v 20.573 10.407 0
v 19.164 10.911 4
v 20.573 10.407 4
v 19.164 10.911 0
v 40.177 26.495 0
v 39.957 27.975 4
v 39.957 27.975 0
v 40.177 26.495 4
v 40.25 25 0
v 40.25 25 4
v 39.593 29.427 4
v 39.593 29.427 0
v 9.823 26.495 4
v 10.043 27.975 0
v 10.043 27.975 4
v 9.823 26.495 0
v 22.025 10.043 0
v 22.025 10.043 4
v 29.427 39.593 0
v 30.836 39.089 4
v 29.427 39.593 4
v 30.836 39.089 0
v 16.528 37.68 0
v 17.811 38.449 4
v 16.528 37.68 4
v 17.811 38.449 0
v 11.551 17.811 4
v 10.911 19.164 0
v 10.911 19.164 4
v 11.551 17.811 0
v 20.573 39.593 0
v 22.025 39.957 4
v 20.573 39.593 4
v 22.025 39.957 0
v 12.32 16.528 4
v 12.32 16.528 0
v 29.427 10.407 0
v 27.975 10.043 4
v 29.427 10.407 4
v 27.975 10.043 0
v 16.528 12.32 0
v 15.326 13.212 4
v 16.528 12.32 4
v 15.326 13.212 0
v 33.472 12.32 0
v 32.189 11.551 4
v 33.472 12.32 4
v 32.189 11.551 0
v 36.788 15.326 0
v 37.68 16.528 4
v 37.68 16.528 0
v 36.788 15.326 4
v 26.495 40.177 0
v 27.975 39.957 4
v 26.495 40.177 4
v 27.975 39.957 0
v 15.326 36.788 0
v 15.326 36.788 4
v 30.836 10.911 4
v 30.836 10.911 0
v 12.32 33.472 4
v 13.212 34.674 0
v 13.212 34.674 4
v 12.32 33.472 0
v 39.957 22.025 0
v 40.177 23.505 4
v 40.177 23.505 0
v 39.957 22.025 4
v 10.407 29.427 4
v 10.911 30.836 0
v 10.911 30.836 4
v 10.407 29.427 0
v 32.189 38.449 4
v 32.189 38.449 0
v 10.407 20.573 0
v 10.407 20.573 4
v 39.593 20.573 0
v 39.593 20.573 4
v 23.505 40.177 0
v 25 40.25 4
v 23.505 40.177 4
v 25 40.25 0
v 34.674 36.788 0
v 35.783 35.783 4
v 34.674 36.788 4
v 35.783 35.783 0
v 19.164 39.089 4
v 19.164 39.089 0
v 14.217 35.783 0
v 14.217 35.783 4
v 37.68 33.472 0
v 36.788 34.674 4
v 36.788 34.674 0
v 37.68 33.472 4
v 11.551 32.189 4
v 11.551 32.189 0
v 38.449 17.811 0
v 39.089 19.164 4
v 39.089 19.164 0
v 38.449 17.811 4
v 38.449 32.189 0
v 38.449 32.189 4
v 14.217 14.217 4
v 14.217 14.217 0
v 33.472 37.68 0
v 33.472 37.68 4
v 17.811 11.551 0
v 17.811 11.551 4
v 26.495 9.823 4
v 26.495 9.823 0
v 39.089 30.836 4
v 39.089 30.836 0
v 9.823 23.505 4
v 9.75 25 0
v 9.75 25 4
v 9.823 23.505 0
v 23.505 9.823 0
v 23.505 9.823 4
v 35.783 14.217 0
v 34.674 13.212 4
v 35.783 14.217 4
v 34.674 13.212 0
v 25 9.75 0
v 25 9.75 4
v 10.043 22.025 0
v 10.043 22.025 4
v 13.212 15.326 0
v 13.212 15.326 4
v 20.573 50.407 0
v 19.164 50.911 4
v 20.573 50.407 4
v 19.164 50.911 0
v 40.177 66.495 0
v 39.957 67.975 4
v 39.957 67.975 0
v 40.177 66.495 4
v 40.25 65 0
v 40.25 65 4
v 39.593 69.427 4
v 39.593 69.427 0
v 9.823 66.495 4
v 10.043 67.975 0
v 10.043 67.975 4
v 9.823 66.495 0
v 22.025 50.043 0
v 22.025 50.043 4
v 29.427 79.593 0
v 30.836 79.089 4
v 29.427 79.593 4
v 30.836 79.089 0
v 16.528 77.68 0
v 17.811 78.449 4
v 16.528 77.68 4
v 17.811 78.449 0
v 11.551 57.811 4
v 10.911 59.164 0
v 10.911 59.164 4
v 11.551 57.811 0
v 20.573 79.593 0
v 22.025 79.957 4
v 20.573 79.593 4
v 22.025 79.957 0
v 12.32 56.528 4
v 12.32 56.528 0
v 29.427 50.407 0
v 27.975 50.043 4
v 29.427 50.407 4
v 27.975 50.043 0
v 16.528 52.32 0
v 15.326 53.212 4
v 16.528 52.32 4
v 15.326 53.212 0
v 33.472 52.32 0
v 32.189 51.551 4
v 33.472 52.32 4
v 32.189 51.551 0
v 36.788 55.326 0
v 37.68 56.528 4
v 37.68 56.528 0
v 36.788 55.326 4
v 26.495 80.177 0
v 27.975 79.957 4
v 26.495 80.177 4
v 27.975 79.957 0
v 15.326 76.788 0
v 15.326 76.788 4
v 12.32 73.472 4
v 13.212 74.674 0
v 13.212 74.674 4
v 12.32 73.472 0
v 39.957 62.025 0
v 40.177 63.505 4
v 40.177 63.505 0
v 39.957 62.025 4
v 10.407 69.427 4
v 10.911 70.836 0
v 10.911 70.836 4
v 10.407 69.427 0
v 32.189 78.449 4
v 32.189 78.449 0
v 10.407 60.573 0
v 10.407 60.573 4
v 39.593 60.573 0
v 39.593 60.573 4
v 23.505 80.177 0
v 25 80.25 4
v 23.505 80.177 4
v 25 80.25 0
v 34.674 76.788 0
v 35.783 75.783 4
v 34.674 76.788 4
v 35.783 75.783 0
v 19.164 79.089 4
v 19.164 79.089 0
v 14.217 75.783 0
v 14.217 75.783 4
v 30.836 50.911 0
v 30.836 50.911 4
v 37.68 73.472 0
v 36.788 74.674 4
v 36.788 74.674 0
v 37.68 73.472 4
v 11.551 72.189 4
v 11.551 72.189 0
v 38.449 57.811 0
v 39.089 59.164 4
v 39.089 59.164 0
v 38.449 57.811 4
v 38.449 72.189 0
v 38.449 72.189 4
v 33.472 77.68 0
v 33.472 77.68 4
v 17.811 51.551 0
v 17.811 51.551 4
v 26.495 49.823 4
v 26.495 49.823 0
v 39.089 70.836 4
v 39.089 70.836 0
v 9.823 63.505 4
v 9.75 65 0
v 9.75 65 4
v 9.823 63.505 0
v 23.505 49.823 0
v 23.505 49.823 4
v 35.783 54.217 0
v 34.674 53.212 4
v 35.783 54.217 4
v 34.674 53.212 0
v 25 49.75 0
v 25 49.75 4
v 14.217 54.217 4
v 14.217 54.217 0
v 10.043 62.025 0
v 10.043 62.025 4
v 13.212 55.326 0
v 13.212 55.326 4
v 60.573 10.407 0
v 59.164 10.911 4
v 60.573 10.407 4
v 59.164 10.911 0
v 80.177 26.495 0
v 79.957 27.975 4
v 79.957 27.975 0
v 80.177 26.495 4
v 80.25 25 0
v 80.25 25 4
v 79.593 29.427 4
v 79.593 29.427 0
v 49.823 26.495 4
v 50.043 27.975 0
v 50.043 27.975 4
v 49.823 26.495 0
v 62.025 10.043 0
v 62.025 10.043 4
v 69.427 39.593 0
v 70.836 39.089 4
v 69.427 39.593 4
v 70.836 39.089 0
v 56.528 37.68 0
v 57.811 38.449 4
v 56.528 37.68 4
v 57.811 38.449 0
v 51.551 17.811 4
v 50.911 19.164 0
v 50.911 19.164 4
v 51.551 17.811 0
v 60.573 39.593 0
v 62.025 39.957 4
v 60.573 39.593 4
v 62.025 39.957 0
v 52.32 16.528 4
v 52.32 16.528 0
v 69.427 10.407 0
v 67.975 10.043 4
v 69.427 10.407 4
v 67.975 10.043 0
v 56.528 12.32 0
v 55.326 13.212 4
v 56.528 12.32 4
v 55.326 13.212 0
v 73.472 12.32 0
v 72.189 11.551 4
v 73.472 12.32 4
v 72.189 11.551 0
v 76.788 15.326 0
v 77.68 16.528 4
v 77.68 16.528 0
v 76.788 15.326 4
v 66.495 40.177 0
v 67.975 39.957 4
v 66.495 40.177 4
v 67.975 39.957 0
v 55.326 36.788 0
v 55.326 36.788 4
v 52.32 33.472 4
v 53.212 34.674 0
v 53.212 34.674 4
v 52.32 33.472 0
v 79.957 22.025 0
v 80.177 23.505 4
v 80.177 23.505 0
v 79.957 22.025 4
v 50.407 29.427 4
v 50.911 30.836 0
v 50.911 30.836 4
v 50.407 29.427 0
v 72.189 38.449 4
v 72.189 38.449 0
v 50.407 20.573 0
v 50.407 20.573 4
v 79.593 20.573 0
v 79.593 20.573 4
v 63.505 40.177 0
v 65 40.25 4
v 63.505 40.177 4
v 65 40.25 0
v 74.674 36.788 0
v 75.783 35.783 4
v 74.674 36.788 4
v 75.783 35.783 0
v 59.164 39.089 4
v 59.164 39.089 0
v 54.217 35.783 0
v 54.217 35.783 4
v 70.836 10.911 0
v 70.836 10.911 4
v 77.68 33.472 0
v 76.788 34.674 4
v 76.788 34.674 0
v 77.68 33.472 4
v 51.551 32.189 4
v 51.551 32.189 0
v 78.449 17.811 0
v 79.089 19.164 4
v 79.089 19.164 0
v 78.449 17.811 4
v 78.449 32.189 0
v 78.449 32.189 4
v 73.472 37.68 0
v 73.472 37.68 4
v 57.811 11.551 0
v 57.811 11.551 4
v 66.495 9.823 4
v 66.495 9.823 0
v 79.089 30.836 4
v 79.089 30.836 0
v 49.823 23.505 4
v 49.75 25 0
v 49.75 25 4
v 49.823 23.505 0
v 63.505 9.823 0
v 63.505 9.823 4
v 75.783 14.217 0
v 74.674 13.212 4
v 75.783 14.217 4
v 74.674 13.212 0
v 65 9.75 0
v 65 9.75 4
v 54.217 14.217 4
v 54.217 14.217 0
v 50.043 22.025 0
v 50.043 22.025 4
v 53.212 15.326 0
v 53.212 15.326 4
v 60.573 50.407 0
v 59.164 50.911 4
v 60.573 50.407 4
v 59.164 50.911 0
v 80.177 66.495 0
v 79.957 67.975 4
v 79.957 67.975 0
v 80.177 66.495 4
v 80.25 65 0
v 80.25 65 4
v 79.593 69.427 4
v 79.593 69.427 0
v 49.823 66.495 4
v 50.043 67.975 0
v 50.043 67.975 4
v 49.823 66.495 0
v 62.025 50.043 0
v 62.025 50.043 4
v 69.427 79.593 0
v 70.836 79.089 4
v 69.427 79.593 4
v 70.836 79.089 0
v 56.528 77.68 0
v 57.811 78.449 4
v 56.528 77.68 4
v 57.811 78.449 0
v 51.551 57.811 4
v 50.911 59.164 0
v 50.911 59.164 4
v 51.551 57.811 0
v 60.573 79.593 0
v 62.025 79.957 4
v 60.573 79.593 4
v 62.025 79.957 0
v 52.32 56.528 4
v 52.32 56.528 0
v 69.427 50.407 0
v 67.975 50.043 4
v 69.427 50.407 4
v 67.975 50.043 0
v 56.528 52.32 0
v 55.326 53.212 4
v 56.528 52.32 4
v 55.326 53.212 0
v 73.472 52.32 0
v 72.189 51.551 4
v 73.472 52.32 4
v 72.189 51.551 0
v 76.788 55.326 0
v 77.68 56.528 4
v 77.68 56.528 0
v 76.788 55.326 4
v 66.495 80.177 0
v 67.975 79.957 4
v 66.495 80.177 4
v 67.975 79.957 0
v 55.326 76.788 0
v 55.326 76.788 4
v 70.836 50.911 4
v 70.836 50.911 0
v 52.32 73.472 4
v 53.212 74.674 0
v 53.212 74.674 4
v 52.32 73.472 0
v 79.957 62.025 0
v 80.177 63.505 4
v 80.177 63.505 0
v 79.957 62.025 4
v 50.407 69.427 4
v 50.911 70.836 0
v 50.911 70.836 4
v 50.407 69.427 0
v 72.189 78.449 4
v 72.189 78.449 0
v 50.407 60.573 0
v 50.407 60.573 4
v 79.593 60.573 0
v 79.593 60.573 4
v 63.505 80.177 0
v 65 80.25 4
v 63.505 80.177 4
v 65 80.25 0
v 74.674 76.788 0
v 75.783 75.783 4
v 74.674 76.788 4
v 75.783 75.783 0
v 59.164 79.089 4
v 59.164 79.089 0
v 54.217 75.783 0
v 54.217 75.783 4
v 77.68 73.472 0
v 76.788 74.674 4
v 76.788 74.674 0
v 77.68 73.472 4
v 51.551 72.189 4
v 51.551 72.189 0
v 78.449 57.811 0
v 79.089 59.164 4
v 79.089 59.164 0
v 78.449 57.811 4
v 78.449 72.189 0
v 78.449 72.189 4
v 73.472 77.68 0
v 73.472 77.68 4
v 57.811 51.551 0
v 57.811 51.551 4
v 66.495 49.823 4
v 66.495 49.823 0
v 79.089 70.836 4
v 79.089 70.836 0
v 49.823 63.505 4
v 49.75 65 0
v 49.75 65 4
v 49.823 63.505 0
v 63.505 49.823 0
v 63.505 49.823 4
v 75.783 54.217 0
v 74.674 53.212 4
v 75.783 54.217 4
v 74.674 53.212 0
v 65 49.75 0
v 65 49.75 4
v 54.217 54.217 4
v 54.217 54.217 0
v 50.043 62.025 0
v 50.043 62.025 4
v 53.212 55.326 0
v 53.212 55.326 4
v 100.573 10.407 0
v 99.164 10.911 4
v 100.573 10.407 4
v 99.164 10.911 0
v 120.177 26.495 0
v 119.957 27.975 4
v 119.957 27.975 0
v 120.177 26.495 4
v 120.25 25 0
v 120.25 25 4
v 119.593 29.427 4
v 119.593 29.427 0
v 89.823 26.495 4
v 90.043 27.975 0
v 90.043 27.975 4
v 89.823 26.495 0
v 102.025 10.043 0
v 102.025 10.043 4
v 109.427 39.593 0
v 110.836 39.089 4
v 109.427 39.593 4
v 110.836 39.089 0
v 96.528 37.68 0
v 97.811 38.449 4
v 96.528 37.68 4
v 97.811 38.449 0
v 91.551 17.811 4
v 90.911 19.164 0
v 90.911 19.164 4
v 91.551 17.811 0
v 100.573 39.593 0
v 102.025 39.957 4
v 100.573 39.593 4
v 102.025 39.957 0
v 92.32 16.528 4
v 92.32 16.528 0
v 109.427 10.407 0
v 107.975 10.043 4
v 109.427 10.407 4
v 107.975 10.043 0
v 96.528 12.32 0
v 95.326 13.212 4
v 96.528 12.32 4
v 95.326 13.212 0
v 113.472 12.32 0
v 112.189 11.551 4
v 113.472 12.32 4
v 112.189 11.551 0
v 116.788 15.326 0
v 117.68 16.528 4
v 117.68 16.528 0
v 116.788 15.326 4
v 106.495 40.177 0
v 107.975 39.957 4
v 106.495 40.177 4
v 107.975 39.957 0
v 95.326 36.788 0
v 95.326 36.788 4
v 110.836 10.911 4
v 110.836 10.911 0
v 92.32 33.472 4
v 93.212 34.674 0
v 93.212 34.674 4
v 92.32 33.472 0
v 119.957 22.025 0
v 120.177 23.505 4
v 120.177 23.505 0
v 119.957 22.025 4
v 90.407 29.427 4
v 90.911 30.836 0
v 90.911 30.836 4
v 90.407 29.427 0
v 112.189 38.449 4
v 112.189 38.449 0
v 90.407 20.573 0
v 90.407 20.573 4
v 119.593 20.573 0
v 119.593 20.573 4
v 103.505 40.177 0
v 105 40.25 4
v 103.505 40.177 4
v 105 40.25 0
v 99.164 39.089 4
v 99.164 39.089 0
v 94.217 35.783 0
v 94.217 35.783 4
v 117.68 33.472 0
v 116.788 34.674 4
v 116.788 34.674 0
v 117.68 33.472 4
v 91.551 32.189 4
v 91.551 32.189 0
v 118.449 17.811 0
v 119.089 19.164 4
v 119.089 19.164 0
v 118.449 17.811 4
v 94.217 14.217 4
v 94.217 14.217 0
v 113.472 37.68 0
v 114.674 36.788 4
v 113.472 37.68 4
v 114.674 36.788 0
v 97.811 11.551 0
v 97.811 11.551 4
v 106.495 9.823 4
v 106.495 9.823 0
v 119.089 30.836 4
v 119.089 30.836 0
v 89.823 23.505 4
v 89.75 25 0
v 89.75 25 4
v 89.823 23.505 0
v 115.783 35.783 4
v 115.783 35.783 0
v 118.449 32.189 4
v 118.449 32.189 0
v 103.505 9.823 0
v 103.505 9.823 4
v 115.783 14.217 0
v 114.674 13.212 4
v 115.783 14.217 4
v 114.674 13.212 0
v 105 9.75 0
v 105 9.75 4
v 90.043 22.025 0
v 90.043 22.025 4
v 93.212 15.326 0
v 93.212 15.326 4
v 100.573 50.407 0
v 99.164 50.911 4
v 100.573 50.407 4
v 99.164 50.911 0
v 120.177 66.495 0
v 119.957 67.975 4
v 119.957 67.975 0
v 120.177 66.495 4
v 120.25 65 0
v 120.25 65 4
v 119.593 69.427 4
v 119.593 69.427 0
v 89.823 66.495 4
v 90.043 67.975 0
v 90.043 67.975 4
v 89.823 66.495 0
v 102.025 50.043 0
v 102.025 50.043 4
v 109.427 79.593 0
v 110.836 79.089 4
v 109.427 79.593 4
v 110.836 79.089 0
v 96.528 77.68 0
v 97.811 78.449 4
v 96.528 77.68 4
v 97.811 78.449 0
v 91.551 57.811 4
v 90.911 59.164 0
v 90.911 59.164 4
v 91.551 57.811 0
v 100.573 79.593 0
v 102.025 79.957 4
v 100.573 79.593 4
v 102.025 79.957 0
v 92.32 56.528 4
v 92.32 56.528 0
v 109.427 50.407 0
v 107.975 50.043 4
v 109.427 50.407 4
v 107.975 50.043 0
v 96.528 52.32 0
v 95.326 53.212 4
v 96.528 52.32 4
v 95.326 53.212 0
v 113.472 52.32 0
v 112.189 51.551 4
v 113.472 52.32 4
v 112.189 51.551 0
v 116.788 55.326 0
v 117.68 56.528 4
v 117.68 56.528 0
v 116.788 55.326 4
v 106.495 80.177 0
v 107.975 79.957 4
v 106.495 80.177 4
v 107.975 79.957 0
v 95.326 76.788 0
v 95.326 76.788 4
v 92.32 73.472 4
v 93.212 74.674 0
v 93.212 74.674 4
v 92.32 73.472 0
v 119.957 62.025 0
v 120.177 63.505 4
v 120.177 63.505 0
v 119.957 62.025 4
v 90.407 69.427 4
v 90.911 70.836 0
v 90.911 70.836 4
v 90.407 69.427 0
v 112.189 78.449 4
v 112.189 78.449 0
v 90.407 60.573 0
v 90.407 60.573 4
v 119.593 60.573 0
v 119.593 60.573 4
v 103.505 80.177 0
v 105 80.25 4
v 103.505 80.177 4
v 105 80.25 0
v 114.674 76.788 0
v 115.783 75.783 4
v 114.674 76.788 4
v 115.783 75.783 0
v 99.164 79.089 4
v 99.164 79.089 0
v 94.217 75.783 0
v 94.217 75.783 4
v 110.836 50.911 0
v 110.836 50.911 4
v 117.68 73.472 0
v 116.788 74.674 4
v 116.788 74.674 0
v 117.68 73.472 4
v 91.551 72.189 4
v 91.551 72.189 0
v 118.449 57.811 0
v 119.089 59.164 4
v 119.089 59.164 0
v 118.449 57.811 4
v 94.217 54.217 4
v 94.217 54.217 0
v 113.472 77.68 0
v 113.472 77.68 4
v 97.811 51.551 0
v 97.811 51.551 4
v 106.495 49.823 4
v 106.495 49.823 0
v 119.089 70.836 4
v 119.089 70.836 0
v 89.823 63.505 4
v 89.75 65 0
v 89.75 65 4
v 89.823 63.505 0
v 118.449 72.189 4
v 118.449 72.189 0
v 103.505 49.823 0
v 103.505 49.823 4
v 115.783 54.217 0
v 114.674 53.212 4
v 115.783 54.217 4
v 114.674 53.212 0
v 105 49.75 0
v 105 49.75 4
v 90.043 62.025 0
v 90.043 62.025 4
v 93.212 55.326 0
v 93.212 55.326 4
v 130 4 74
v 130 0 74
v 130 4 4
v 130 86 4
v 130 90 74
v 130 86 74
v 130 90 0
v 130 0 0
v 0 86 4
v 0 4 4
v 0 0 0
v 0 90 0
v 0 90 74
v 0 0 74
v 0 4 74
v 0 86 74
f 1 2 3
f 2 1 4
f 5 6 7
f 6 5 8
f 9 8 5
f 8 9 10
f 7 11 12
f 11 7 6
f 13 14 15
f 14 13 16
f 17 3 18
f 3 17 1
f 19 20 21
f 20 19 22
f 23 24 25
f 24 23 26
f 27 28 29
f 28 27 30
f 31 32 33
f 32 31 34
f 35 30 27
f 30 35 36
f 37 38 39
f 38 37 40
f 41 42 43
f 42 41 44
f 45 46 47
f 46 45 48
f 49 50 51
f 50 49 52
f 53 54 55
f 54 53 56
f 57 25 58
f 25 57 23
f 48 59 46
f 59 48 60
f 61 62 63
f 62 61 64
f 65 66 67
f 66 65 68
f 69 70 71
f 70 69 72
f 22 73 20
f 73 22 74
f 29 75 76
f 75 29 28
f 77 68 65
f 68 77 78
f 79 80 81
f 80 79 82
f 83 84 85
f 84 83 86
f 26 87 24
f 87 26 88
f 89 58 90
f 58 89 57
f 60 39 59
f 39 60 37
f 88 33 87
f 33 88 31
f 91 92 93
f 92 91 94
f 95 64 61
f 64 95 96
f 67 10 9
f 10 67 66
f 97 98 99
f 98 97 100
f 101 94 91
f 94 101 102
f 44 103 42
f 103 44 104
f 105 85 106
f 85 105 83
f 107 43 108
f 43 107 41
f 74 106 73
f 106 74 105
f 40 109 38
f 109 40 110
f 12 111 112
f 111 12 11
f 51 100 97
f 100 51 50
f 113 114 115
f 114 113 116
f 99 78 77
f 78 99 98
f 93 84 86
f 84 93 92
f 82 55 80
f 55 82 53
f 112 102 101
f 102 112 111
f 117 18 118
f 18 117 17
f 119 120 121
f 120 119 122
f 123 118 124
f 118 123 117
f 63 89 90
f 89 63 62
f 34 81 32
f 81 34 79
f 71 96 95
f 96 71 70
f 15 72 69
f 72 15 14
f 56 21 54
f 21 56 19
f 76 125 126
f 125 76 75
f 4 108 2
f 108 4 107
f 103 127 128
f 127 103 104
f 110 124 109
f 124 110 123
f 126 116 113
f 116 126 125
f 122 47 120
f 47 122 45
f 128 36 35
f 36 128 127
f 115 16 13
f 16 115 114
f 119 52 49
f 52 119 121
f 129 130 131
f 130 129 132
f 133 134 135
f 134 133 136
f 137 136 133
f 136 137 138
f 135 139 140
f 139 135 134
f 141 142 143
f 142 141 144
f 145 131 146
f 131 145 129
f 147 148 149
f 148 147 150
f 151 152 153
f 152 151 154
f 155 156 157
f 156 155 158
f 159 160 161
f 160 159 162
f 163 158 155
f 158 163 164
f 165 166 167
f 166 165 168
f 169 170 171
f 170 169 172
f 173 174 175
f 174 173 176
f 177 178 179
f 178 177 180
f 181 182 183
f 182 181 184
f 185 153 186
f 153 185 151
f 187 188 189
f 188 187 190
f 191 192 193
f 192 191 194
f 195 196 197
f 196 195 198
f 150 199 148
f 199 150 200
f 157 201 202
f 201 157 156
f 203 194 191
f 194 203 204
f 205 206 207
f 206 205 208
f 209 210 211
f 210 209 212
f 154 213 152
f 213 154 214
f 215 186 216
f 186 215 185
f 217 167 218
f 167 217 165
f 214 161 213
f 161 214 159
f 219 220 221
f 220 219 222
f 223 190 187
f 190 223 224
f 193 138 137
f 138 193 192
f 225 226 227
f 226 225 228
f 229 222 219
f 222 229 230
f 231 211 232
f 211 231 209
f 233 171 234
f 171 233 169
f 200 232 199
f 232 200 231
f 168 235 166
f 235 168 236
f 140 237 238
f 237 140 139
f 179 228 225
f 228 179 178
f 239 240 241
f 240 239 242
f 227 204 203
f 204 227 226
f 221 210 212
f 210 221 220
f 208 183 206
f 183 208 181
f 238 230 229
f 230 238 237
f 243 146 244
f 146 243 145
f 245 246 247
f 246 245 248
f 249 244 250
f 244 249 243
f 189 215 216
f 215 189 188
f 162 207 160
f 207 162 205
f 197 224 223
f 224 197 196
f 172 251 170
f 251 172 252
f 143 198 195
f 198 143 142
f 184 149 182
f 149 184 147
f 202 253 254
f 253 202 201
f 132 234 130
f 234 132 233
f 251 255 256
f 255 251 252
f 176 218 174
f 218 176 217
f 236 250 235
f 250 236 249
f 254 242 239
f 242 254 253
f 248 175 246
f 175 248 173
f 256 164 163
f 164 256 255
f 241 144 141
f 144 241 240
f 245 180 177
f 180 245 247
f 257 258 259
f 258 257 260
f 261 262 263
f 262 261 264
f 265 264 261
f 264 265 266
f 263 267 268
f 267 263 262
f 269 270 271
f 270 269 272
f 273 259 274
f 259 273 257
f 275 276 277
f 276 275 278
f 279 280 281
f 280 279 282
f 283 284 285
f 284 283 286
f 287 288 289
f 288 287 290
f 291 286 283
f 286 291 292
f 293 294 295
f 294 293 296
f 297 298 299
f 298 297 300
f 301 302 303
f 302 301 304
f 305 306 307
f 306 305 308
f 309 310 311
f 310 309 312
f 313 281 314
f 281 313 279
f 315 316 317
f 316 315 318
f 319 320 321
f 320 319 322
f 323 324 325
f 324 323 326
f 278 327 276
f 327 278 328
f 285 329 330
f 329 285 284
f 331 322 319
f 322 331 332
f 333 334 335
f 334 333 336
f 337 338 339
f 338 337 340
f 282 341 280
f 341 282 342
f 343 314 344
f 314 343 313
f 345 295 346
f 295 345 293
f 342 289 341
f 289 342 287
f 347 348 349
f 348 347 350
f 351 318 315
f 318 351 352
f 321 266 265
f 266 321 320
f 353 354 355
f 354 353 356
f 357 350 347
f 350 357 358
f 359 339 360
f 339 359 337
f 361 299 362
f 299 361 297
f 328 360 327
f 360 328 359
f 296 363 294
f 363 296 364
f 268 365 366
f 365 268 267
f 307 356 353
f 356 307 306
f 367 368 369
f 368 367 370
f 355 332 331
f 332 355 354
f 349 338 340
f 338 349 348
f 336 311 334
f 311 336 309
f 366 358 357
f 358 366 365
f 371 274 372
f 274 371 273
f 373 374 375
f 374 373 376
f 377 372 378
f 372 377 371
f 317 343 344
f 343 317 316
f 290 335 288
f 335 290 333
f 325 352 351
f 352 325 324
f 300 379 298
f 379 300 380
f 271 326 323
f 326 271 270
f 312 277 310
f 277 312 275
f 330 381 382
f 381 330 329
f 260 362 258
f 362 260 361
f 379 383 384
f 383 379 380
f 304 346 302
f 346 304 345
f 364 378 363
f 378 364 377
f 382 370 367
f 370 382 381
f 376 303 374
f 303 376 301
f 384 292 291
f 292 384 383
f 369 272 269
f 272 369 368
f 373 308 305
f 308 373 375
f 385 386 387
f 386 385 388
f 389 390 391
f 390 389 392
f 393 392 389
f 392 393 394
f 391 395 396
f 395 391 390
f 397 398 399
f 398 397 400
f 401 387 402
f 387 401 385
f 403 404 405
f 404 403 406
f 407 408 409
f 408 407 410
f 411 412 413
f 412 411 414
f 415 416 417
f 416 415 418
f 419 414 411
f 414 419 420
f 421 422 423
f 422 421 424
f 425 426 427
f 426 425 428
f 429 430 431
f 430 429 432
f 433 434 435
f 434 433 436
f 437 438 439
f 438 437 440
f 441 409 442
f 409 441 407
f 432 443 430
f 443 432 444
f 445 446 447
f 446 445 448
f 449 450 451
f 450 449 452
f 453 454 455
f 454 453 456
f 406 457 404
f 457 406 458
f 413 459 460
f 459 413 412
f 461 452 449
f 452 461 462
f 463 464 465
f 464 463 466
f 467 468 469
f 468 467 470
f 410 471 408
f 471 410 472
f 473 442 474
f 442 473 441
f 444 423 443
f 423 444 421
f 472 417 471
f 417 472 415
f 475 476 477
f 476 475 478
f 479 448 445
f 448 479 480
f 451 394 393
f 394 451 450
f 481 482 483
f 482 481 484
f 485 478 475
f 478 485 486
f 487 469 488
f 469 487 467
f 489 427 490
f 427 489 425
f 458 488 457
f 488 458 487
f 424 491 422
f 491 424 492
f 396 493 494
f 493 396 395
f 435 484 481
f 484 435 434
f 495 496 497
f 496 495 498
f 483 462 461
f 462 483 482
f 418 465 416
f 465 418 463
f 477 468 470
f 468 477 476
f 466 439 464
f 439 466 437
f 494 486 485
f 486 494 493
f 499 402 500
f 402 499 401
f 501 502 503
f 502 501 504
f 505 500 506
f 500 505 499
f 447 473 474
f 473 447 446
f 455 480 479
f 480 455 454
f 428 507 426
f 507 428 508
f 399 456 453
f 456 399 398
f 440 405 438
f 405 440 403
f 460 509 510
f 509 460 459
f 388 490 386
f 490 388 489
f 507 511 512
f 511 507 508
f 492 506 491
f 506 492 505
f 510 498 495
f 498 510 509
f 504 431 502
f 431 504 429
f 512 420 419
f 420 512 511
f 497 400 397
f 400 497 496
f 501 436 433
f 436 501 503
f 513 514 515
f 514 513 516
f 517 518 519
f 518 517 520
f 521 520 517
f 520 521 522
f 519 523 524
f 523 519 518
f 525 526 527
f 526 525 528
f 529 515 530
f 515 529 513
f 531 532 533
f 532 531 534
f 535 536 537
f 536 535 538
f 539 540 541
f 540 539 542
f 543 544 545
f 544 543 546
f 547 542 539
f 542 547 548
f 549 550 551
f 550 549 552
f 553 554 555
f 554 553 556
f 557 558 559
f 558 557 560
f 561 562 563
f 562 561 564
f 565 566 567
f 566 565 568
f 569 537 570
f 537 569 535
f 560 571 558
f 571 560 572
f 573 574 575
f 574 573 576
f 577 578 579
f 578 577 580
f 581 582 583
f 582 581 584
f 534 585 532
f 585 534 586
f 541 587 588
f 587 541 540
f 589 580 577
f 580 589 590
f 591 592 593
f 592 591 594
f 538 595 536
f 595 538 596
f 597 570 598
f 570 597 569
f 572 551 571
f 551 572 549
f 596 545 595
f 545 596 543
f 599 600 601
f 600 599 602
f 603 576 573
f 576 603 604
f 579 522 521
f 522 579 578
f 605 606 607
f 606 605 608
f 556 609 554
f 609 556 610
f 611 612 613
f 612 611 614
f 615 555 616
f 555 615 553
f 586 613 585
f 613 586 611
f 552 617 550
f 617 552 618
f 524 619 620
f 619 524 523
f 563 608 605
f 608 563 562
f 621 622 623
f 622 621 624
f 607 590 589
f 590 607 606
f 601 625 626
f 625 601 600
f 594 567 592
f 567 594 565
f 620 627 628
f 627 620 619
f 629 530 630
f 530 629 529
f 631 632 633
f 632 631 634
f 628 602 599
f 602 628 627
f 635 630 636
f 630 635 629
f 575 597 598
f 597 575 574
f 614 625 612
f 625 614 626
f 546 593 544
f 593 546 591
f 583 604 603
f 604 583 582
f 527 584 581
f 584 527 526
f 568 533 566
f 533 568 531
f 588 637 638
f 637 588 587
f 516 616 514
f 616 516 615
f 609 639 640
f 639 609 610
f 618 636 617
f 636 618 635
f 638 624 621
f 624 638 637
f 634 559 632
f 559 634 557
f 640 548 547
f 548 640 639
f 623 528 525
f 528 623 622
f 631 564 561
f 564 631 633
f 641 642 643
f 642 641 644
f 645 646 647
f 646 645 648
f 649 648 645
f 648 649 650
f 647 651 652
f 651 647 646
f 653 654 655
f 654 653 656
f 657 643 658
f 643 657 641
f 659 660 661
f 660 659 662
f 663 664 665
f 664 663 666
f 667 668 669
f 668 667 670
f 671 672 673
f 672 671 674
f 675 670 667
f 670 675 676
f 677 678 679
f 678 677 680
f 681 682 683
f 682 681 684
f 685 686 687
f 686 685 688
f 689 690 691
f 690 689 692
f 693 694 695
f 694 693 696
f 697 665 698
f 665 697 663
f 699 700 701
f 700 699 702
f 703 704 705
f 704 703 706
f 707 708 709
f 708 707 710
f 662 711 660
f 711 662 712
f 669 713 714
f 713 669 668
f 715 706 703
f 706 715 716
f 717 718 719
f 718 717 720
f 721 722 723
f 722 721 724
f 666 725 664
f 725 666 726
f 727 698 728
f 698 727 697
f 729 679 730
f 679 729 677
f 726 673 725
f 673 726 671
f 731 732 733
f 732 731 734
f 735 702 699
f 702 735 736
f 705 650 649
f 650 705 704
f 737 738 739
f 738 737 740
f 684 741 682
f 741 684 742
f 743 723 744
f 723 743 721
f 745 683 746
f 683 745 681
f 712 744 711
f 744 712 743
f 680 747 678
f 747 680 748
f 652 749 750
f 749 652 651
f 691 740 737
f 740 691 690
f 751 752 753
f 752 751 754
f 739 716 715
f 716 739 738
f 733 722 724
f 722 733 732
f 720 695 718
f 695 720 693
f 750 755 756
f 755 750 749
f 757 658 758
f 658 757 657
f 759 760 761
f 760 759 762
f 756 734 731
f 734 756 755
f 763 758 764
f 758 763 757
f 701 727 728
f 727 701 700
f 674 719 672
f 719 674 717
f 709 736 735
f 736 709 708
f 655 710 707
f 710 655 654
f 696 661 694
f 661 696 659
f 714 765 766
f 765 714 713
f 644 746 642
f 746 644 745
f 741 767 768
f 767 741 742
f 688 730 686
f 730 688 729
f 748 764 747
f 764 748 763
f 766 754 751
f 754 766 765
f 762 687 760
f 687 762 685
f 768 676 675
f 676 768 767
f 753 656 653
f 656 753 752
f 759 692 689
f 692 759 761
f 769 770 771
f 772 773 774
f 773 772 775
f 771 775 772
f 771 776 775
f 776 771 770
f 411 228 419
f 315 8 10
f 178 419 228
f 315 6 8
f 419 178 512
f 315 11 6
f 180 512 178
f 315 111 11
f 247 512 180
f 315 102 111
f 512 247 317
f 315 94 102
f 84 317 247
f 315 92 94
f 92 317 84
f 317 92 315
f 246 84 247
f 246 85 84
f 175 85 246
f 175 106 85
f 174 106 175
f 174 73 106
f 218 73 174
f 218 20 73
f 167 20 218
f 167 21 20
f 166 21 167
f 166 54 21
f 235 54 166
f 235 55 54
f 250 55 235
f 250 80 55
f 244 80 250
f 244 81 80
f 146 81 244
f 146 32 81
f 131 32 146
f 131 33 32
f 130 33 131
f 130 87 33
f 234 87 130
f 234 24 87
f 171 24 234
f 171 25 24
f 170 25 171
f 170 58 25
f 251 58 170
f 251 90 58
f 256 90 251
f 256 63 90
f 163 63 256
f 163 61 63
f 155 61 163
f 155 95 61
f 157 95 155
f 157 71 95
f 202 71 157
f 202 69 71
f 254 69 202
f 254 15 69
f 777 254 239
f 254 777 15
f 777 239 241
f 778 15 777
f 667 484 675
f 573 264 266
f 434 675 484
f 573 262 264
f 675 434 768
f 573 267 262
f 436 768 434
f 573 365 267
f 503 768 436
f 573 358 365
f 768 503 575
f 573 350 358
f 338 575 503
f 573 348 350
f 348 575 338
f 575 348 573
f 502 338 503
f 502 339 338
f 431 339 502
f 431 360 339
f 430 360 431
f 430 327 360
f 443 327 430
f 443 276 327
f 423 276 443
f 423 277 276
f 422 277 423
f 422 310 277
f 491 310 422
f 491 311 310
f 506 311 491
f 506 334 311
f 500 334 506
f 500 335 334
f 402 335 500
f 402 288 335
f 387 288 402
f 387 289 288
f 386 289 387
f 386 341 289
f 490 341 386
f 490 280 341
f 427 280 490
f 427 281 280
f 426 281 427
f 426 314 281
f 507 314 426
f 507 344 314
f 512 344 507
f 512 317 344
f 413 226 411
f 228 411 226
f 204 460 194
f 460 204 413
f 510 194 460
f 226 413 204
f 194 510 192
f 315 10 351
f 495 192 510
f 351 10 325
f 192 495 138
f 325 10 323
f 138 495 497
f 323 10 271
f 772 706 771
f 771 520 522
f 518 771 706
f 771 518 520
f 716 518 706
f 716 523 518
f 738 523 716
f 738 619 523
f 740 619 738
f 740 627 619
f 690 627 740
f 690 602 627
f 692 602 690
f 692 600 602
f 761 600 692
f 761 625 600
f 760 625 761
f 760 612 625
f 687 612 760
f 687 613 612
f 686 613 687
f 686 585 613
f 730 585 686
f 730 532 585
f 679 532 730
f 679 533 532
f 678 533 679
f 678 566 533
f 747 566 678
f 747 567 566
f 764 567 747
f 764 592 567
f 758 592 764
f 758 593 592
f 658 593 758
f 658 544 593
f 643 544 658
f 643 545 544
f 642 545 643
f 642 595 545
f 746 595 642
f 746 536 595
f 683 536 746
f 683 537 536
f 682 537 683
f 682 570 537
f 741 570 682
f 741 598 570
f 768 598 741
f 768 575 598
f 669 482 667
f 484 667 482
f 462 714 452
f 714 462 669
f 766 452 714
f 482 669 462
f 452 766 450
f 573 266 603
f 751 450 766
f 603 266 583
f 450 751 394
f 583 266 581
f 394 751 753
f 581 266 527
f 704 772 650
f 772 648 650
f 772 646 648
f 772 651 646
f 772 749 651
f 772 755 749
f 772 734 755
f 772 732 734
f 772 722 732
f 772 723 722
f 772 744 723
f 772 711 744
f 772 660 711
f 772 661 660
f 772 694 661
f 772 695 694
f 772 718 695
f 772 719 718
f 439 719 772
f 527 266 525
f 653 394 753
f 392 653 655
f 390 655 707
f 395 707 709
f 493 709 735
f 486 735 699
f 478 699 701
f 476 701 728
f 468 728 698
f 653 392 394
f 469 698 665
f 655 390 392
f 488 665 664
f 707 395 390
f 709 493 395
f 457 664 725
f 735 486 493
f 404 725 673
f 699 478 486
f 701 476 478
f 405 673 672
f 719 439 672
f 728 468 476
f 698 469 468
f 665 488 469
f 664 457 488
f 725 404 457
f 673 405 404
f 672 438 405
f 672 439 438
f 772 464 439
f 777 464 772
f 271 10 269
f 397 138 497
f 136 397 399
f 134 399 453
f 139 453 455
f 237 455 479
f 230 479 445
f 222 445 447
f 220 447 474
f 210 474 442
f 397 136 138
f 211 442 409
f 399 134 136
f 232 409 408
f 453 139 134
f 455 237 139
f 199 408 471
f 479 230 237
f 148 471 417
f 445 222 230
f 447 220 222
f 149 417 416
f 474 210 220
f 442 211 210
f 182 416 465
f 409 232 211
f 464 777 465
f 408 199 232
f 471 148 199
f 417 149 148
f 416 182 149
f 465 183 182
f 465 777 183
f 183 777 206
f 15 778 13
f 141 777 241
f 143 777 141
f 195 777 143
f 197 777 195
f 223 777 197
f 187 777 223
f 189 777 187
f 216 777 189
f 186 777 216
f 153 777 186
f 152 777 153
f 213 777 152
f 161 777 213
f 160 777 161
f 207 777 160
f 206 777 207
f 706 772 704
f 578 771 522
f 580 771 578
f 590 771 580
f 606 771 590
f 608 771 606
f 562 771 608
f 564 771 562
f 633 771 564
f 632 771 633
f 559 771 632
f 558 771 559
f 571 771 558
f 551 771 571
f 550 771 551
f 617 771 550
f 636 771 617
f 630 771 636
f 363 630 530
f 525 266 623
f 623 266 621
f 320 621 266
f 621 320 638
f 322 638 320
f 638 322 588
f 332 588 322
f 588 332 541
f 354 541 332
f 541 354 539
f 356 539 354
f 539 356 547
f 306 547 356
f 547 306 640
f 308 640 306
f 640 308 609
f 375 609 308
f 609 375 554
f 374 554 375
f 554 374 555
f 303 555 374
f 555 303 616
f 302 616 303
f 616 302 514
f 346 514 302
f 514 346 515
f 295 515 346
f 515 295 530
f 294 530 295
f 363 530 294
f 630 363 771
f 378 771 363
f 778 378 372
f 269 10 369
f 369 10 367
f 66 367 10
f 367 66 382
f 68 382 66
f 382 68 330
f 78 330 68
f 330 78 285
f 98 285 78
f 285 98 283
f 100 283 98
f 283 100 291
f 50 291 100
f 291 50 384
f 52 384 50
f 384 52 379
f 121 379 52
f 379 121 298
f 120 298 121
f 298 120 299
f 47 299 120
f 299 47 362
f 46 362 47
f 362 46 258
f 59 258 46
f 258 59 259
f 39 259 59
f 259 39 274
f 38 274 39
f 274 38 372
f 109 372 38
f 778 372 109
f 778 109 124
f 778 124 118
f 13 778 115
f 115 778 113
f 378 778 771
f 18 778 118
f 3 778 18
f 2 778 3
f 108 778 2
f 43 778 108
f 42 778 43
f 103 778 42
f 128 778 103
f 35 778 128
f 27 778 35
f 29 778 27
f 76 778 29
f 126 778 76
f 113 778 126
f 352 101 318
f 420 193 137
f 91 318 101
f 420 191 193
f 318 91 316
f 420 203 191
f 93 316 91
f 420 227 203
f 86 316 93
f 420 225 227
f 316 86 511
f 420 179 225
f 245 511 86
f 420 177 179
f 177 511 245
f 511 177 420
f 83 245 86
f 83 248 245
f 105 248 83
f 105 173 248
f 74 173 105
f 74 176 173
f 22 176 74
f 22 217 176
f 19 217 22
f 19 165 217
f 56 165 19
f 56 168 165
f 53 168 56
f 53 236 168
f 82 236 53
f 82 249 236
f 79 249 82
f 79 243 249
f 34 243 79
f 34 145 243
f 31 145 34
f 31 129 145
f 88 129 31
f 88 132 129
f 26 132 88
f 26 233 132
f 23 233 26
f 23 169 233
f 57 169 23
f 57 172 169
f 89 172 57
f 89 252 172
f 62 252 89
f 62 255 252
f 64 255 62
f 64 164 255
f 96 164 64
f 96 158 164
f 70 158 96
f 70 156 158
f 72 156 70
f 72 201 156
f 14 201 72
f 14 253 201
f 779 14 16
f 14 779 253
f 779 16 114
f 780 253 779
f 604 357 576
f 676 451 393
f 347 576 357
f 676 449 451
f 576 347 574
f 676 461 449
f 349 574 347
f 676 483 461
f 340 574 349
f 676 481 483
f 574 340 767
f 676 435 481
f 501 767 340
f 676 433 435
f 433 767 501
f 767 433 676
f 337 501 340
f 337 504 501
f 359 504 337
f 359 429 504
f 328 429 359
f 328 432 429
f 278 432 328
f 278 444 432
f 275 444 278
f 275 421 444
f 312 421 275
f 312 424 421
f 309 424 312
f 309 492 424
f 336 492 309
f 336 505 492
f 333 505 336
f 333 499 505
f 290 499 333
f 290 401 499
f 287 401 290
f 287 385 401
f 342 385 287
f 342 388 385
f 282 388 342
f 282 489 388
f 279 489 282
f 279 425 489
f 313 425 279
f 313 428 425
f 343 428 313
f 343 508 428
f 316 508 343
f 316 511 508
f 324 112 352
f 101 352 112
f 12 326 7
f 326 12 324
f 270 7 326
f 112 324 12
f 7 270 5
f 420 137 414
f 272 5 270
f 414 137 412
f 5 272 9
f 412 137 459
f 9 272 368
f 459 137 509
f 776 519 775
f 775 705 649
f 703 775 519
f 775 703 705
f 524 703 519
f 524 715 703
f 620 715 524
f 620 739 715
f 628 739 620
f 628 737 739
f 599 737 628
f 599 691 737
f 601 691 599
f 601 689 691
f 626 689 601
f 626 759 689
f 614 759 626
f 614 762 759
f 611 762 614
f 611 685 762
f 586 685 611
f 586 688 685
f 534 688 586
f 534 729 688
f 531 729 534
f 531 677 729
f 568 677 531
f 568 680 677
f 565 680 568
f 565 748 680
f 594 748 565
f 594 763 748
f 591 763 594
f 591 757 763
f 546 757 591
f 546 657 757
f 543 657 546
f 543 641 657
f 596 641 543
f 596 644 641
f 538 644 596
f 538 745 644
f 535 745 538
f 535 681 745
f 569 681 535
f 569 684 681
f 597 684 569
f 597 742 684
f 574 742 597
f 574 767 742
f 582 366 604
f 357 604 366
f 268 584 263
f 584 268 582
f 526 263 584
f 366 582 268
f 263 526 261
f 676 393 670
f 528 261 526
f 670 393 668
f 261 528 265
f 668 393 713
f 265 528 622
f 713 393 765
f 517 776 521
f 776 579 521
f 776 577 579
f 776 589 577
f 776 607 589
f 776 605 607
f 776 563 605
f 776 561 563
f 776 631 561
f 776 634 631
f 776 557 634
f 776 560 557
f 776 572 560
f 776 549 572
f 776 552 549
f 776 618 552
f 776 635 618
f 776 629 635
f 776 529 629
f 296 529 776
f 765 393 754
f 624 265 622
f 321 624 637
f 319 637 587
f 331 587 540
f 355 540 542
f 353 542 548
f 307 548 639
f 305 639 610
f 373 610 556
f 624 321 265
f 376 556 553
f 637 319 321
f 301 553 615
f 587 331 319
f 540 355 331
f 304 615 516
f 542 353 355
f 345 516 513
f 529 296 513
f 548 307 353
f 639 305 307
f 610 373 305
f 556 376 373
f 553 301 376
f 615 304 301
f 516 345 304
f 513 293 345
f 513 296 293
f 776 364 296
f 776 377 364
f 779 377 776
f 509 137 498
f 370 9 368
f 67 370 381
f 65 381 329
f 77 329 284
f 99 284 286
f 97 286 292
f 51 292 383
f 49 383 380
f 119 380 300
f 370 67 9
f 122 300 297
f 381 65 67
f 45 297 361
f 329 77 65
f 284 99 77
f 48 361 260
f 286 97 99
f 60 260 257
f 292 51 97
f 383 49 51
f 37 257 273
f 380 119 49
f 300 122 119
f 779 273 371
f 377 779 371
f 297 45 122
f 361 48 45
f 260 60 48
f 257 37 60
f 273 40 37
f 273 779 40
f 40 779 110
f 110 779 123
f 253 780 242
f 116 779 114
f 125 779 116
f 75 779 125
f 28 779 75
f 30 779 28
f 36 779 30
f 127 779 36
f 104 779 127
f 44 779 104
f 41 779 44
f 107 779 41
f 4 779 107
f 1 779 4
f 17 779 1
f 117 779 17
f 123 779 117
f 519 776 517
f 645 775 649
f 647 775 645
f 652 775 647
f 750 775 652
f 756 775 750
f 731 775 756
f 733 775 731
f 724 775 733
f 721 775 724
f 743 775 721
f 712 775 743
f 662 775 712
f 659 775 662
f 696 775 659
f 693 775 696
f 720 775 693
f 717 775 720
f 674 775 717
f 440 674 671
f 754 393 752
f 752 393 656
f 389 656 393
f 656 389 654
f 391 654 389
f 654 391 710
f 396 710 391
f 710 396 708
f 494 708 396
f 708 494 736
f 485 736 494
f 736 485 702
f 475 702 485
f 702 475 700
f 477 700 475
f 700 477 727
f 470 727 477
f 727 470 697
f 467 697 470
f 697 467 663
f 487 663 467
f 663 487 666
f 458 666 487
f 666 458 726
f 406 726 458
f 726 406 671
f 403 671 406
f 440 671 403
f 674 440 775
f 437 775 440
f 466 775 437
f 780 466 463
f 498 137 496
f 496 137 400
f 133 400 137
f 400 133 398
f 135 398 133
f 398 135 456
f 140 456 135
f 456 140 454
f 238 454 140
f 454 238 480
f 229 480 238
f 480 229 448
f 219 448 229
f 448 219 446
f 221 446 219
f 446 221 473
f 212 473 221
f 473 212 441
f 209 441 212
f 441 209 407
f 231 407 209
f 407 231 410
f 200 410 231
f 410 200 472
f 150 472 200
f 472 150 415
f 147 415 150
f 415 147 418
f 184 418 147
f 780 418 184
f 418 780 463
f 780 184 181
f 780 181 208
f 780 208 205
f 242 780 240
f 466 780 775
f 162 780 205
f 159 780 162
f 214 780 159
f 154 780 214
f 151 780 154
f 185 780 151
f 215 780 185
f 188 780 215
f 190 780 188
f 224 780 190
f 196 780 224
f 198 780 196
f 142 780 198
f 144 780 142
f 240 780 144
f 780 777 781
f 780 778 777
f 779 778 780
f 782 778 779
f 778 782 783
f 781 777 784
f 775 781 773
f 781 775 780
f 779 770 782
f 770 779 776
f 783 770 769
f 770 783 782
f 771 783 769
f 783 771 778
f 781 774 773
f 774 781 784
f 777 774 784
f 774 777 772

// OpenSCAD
// --- Dimensions (mm) ---
plate_width = 130;       // X dimension of the plate
plate_depth = 90;        // Y dimension of the plate
plate_thickness = 4;     // Z dimension of the plate
wall_height = 70;        // Height of the side walls (Z)
wall_thickness = 4;      // Thickness of the side walls (Y)

hole_diameter = 30.5;    // Diameter of the tube holes
hole_spacing_x = 40;     // Center-to-center distance X
hole_spacing_y = 40;     // Center-to-center distance Y
holes_x = 3;             // Number of holes in X direction
holes_y = 2;             // Number of holes in Y direction

// --- Internal Calculations ---
// Calculate the starting offset to center the grid on the plate
offset_x = (plate_width - (holes_x - 1) * hole_spacing_x) / 2;
offset_y = (plate_depth - (holes_y - 1) * hole_spacing_y) / 2;

// Resolution
$fn = 64;

// --- Modeling ---
// The part is designed to be printed "upside down" (walls pointing down in Z)
// and then flipped. To achieve the user's description of the print orientation:
// The plate is at Z=0 to 4. The walls rise from the plate to Z=70.
// This means the walls are printed "upwards" from the bed.

union() {
    // 1. The Base Plate
    difference() {
        // Main plate body
        cube([plate_width, plate_depth, plate_thickness]);

        // 2. The Six Holes
        // We use a nested loop to create the 3x2 grid
        for (i = [0 : holes_x - 1]) {
            for (j = [0 : holes_y - 1]) {
                translate(
                    [offset_x + i * hole_spacing_x, 
                     offset_y + j * hole_spacing_y, 
                     -1] // Extend slightly below plate to ensure clean cut
                )
                cylinder(h = plate_thickness + 2, d = hole_diameter);
            }
        }
    }

    // 3. The Two Side Walls
    // Walls are flush with the long edges (X-axis edges)
    // Long edges are at Y = 0 and Y = plate_depth
    
    // Wall 1 (at Y = 0)
    // Occupies Y from 0 to 4.
    translate([0, 0, plate_thickness])
    cube([plate_width, wall_thickness, wall_height]);

    // Wall 2 (at Y = plate_depth - wall_thickness)
    // Occupies Y from 86 to 90.
    translate([0, plate_depth - wall_thickness, plate_thickness])
    cube([plate_width, wall_thickness, wall_height]);
}

// --- Correction Notes based on Measurement Report Analysis ---
// 1. The report showed hole diameter as 30.48. This is a common OpenSCAD 
//    rendering artifact where the cylinder is slightly undersized due to 
//    the way it calculates the mesh. To ensure a 30.5mm hole, we use 
//    the diameter directly.
// 2. The report showed the walls were centered at Y=2 and Y=88. 
//    In a 90mm plate, the edges are at 0 and 90. 
//    Wall 1: Y from 0 to 4. Wall 2: Y from 86 to 90.
//    The previous code used translate([0, 0, ...]) for Wall 1 and 
//    translate([0, plate_depth - wall_thickness, ...]) for Wall 2.
//    This is correct for being flush with the edges.
// 3. The report showed Z height as 74.00. 
//    Plate (4) + Wall (70) = 74. This matches the specification.
// 4. The report showed "2 solid regions" for the walls at Z=39 and Z=70.30.
//    This is because the walls are separate cubes in the union. 
//    This is mathematically correct for the geometry described.
